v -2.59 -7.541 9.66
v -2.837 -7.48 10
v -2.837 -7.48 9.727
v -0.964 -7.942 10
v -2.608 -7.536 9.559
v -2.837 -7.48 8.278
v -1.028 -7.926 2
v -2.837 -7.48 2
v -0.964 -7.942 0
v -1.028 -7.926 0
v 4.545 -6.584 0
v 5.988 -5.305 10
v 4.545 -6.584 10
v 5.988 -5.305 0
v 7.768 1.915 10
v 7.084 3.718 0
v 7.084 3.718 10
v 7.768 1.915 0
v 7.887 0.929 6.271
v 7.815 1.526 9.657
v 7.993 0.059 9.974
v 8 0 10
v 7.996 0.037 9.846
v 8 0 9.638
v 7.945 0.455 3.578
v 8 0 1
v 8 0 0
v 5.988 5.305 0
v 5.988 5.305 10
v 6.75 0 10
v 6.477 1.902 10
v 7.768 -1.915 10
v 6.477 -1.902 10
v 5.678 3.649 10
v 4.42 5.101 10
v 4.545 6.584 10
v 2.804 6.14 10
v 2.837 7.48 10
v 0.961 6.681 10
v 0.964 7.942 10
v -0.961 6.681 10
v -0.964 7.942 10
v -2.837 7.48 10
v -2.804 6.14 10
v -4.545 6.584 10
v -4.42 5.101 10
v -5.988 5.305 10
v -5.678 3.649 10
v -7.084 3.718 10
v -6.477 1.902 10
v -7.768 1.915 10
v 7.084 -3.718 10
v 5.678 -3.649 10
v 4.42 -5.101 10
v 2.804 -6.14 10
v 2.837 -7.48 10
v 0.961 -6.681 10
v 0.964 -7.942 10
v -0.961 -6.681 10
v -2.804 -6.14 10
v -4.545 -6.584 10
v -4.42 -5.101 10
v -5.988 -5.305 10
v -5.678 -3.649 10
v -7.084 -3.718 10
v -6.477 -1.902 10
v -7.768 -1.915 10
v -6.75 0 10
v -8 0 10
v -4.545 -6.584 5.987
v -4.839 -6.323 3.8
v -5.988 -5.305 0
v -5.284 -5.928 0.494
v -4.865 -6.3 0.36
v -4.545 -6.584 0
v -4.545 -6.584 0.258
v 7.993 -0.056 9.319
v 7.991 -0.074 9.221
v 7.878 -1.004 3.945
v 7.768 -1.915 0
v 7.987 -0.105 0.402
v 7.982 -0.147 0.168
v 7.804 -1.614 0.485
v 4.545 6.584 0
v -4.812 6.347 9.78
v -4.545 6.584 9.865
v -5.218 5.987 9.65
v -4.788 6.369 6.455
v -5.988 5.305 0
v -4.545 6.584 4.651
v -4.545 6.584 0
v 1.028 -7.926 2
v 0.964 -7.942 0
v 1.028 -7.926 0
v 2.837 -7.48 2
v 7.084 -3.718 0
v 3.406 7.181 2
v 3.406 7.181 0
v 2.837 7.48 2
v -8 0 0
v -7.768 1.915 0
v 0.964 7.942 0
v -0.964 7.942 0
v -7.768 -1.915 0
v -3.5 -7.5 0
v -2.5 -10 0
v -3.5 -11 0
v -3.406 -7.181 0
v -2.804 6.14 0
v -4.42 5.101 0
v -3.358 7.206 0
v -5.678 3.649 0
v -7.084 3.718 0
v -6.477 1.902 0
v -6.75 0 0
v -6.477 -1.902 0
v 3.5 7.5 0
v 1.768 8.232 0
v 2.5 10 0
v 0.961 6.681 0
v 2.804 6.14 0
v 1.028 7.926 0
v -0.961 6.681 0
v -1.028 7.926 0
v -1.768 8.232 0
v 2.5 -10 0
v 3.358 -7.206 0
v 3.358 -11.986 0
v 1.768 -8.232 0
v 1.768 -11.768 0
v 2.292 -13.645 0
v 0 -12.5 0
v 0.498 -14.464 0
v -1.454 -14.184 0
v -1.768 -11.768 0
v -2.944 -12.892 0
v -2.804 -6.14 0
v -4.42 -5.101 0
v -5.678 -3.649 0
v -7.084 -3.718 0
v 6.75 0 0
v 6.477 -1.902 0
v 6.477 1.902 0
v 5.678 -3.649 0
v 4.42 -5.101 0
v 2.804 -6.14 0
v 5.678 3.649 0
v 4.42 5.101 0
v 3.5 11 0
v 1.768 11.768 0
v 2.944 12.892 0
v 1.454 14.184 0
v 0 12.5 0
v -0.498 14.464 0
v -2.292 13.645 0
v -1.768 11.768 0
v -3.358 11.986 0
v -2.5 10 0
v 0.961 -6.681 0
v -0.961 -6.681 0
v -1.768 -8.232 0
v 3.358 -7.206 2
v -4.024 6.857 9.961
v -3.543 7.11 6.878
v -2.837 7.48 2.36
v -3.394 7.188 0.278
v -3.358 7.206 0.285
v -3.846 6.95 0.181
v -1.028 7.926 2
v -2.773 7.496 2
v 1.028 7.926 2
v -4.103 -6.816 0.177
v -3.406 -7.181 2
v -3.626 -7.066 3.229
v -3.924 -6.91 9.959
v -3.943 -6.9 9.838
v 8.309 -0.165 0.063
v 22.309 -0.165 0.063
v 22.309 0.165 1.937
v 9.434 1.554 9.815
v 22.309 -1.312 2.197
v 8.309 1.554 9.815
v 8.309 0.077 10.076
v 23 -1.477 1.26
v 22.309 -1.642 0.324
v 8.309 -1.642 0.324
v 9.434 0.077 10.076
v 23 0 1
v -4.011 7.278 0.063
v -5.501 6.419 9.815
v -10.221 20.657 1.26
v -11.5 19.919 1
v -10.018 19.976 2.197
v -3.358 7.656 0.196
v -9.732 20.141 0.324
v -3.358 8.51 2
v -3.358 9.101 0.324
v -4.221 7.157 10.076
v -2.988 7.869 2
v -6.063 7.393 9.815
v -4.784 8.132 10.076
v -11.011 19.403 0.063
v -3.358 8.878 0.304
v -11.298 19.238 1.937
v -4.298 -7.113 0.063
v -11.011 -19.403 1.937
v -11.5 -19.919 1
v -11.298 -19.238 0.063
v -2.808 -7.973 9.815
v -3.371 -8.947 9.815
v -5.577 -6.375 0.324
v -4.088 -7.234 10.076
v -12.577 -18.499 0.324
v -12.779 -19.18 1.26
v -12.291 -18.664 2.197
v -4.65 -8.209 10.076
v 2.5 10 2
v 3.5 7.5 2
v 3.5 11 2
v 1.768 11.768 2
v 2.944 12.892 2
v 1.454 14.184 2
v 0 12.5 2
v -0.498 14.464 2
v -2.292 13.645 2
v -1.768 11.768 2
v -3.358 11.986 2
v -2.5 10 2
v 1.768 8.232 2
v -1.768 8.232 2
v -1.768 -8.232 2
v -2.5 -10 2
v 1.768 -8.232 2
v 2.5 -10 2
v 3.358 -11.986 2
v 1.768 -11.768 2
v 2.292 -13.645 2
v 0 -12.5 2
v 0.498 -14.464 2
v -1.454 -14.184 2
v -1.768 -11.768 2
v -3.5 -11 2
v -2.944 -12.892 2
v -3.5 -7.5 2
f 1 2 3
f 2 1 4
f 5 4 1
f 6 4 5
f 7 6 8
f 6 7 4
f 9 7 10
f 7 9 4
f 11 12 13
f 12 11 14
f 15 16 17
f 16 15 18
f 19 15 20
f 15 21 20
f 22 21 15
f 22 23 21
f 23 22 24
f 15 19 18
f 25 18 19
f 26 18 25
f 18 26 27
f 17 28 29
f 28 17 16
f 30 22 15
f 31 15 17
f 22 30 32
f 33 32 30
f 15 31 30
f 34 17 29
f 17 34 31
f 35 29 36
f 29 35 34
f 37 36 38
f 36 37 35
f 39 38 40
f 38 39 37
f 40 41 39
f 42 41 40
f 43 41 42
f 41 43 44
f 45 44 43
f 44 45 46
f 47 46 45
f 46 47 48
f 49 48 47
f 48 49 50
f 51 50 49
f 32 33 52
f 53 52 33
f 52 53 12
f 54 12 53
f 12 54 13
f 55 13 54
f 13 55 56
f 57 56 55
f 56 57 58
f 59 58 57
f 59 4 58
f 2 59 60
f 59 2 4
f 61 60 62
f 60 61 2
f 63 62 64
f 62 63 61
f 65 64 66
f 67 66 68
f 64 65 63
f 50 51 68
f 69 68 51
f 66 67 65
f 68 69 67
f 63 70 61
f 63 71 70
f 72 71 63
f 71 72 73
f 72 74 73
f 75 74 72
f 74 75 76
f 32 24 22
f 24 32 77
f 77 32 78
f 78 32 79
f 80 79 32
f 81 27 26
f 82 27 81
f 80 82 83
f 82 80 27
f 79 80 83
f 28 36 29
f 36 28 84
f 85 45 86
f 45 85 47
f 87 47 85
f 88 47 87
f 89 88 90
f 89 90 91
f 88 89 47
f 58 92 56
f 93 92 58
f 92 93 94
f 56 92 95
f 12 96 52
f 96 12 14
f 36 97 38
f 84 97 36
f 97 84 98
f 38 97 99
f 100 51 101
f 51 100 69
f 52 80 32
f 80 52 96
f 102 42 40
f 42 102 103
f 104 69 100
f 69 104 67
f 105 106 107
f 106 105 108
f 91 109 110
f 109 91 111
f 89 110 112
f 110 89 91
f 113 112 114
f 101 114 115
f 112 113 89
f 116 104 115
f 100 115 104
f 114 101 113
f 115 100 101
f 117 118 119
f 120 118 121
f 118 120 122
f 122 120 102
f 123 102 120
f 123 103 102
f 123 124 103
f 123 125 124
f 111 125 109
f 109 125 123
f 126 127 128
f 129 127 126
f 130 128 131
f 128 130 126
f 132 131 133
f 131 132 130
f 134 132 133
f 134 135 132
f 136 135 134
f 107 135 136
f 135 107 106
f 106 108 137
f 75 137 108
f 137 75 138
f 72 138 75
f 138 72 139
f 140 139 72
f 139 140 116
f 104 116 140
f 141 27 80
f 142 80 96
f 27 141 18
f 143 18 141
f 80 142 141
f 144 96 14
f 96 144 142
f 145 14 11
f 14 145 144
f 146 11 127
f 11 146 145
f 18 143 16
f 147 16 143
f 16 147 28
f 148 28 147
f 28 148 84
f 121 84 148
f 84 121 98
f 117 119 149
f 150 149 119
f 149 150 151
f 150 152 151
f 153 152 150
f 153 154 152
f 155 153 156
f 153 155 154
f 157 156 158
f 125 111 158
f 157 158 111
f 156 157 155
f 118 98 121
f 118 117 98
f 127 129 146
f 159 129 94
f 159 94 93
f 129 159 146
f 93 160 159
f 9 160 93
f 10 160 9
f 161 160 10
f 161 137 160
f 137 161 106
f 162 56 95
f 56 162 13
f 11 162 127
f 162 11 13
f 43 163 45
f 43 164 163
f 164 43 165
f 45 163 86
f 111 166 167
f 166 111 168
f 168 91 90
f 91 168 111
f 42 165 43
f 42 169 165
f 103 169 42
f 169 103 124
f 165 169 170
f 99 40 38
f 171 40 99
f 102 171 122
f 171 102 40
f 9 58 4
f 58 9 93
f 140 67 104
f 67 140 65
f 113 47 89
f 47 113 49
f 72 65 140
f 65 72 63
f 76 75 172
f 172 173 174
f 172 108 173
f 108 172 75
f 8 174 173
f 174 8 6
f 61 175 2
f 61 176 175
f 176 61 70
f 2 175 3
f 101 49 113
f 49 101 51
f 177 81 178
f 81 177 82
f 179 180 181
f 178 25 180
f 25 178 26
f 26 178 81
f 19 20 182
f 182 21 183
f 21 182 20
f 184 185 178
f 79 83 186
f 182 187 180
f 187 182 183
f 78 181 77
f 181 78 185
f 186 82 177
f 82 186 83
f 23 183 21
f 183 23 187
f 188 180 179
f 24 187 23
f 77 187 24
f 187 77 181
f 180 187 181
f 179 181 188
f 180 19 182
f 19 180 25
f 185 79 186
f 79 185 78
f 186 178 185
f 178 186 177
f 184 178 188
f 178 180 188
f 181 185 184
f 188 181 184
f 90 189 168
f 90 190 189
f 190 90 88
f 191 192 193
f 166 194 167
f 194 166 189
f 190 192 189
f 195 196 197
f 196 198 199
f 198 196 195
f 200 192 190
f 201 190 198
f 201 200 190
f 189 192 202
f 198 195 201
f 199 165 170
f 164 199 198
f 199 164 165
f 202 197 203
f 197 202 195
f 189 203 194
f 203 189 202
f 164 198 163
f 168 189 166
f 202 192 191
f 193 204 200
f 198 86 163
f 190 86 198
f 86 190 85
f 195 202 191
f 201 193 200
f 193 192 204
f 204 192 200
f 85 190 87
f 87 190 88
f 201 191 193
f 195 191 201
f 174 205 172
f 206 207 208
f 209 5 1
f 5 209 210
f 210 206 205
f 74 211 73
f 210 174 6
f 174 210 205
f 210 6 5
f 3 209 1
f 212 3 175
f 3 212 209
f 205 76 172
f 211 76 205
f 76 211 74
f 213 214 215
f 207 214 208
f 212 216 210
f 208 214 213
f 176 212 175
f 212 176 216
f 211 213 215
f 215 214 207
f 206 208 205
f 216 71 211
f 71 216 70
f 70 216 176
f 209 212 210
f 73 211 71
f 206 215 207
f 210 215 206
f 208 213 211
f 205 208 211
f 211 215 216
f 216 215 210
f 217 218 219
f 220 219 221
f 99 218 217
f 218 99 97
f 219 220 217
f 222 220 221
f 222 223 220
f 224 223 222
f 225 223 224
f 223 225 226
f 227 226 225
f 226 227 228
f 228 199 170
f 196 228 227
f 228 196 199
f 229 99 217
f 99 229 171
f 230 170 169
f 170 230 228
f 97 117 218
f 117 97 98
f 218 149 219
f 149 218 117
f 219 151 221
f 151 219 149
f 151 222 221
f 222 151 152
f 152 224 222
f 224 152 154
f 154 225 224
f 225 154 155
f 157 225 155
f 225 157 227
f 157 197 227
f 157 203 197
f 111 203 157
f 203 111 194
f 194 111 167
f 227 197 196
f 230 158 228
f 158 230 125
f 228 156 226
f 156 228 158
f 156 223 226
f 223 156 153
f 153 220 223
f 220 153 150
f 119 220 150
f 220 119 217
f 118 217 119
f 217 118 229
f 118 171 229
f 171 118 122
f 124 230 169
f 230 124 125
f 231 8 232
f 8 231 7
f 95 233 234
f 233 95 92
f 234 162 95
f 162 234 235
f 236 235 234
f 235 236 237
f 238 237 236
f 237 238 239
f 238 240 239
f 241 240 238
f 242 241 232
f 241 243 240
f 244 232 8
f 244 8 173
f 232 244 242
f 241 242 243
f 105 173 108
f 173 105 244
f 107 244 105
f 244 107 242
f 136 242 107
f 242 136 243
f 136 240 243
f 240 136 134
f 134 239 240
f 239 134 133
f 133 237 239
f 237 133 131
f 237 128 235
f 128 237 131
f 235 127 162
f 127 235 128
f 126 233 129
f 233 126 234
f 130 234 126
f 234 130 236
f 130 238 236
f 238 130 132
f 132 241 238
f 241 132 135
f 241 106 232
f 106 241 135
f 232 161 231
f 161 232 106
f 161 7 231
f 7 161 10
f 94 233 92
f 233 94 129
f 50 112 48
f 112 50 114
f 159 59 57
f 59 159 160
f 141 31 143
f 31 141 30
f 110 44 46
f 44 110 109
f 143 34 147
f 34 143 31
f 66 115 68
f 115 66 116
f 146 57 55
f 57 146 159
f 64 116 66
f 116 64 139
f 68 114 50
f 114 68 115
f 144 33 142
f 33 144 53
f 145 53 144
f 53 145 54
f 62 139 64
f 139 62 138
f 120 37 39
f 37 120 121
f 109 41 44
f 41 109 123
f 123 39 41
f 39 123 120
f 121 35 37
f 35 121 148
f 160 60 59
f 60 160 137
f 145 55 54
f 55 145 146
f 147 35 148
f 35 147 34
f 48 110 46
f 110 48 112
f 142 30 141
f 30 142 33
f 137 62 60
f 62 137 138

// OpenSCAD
atd=13;
ath=60;
lfs=0.5;

wall=2.5;
bh=10;
finwall=1.5;
fh=10;
lugdi=2.5;
lugw=1;
lugvw=2;
module estesa103t()
{
	 cylinder(r=atd/2,h=ath);
}
module linconn()
{
	//translate([0,0,lugvw/2])
	//scale([1,1,lugvw])
	linear_extrude(height = lugvw)
	difference(){
		hull(){
			translate([0,lugdi+lugw,0]) circle(lugdi+lugw);
			circle(lugdi+lugw);
		}
		translate([0,lugdi,0]) circle(lugdi);

	}

}
module fin()
{
	//translate([0,0,finwall/2])
	//scale([1,finwall,1])
	translate([0,0,1])
	rotate([80,0,0])
	linear_extrude(height = finwall)
	union(){
		hull(){
			translate([(fh*3-2)/2,0,0]) circle(1);
			translate([0,fh-2,0]) circle(1);
			translate([(fh*2-2)/16,fh-2,0]) circle(1);
			circle(1);
		}
	}
}
module craftbase()
{
	difference(){
		union(){
			cylinder(r=(atd+lfs+wall)/2,h=bh);

			translate([(atd+lfs+wall)/2,0,0])
			fin();
			rotate([0,0,360/3])
			translate([(atd+lfs+wall)/2,0,0])
			fin();
			rotate([0,0,(360/3)*2])
			translate([(atd+lfs+wall)/2,0,0])
			fin();
			rotate([0,0,90])
			translate([7.5,0,0])
			rotate([0,0,-90])
			linconn();
			rotate([0,0,-90])
			translate([7.5,0,0])
			rotate([0,0,-90])
			linconn();
		}

		translate([0,0,-1])
		cylinder(r=(atd+lfs)/2,h=bh+2);
	}//difference

}
translate ([0,0,+5])
% estesa103t();
craftbase();
